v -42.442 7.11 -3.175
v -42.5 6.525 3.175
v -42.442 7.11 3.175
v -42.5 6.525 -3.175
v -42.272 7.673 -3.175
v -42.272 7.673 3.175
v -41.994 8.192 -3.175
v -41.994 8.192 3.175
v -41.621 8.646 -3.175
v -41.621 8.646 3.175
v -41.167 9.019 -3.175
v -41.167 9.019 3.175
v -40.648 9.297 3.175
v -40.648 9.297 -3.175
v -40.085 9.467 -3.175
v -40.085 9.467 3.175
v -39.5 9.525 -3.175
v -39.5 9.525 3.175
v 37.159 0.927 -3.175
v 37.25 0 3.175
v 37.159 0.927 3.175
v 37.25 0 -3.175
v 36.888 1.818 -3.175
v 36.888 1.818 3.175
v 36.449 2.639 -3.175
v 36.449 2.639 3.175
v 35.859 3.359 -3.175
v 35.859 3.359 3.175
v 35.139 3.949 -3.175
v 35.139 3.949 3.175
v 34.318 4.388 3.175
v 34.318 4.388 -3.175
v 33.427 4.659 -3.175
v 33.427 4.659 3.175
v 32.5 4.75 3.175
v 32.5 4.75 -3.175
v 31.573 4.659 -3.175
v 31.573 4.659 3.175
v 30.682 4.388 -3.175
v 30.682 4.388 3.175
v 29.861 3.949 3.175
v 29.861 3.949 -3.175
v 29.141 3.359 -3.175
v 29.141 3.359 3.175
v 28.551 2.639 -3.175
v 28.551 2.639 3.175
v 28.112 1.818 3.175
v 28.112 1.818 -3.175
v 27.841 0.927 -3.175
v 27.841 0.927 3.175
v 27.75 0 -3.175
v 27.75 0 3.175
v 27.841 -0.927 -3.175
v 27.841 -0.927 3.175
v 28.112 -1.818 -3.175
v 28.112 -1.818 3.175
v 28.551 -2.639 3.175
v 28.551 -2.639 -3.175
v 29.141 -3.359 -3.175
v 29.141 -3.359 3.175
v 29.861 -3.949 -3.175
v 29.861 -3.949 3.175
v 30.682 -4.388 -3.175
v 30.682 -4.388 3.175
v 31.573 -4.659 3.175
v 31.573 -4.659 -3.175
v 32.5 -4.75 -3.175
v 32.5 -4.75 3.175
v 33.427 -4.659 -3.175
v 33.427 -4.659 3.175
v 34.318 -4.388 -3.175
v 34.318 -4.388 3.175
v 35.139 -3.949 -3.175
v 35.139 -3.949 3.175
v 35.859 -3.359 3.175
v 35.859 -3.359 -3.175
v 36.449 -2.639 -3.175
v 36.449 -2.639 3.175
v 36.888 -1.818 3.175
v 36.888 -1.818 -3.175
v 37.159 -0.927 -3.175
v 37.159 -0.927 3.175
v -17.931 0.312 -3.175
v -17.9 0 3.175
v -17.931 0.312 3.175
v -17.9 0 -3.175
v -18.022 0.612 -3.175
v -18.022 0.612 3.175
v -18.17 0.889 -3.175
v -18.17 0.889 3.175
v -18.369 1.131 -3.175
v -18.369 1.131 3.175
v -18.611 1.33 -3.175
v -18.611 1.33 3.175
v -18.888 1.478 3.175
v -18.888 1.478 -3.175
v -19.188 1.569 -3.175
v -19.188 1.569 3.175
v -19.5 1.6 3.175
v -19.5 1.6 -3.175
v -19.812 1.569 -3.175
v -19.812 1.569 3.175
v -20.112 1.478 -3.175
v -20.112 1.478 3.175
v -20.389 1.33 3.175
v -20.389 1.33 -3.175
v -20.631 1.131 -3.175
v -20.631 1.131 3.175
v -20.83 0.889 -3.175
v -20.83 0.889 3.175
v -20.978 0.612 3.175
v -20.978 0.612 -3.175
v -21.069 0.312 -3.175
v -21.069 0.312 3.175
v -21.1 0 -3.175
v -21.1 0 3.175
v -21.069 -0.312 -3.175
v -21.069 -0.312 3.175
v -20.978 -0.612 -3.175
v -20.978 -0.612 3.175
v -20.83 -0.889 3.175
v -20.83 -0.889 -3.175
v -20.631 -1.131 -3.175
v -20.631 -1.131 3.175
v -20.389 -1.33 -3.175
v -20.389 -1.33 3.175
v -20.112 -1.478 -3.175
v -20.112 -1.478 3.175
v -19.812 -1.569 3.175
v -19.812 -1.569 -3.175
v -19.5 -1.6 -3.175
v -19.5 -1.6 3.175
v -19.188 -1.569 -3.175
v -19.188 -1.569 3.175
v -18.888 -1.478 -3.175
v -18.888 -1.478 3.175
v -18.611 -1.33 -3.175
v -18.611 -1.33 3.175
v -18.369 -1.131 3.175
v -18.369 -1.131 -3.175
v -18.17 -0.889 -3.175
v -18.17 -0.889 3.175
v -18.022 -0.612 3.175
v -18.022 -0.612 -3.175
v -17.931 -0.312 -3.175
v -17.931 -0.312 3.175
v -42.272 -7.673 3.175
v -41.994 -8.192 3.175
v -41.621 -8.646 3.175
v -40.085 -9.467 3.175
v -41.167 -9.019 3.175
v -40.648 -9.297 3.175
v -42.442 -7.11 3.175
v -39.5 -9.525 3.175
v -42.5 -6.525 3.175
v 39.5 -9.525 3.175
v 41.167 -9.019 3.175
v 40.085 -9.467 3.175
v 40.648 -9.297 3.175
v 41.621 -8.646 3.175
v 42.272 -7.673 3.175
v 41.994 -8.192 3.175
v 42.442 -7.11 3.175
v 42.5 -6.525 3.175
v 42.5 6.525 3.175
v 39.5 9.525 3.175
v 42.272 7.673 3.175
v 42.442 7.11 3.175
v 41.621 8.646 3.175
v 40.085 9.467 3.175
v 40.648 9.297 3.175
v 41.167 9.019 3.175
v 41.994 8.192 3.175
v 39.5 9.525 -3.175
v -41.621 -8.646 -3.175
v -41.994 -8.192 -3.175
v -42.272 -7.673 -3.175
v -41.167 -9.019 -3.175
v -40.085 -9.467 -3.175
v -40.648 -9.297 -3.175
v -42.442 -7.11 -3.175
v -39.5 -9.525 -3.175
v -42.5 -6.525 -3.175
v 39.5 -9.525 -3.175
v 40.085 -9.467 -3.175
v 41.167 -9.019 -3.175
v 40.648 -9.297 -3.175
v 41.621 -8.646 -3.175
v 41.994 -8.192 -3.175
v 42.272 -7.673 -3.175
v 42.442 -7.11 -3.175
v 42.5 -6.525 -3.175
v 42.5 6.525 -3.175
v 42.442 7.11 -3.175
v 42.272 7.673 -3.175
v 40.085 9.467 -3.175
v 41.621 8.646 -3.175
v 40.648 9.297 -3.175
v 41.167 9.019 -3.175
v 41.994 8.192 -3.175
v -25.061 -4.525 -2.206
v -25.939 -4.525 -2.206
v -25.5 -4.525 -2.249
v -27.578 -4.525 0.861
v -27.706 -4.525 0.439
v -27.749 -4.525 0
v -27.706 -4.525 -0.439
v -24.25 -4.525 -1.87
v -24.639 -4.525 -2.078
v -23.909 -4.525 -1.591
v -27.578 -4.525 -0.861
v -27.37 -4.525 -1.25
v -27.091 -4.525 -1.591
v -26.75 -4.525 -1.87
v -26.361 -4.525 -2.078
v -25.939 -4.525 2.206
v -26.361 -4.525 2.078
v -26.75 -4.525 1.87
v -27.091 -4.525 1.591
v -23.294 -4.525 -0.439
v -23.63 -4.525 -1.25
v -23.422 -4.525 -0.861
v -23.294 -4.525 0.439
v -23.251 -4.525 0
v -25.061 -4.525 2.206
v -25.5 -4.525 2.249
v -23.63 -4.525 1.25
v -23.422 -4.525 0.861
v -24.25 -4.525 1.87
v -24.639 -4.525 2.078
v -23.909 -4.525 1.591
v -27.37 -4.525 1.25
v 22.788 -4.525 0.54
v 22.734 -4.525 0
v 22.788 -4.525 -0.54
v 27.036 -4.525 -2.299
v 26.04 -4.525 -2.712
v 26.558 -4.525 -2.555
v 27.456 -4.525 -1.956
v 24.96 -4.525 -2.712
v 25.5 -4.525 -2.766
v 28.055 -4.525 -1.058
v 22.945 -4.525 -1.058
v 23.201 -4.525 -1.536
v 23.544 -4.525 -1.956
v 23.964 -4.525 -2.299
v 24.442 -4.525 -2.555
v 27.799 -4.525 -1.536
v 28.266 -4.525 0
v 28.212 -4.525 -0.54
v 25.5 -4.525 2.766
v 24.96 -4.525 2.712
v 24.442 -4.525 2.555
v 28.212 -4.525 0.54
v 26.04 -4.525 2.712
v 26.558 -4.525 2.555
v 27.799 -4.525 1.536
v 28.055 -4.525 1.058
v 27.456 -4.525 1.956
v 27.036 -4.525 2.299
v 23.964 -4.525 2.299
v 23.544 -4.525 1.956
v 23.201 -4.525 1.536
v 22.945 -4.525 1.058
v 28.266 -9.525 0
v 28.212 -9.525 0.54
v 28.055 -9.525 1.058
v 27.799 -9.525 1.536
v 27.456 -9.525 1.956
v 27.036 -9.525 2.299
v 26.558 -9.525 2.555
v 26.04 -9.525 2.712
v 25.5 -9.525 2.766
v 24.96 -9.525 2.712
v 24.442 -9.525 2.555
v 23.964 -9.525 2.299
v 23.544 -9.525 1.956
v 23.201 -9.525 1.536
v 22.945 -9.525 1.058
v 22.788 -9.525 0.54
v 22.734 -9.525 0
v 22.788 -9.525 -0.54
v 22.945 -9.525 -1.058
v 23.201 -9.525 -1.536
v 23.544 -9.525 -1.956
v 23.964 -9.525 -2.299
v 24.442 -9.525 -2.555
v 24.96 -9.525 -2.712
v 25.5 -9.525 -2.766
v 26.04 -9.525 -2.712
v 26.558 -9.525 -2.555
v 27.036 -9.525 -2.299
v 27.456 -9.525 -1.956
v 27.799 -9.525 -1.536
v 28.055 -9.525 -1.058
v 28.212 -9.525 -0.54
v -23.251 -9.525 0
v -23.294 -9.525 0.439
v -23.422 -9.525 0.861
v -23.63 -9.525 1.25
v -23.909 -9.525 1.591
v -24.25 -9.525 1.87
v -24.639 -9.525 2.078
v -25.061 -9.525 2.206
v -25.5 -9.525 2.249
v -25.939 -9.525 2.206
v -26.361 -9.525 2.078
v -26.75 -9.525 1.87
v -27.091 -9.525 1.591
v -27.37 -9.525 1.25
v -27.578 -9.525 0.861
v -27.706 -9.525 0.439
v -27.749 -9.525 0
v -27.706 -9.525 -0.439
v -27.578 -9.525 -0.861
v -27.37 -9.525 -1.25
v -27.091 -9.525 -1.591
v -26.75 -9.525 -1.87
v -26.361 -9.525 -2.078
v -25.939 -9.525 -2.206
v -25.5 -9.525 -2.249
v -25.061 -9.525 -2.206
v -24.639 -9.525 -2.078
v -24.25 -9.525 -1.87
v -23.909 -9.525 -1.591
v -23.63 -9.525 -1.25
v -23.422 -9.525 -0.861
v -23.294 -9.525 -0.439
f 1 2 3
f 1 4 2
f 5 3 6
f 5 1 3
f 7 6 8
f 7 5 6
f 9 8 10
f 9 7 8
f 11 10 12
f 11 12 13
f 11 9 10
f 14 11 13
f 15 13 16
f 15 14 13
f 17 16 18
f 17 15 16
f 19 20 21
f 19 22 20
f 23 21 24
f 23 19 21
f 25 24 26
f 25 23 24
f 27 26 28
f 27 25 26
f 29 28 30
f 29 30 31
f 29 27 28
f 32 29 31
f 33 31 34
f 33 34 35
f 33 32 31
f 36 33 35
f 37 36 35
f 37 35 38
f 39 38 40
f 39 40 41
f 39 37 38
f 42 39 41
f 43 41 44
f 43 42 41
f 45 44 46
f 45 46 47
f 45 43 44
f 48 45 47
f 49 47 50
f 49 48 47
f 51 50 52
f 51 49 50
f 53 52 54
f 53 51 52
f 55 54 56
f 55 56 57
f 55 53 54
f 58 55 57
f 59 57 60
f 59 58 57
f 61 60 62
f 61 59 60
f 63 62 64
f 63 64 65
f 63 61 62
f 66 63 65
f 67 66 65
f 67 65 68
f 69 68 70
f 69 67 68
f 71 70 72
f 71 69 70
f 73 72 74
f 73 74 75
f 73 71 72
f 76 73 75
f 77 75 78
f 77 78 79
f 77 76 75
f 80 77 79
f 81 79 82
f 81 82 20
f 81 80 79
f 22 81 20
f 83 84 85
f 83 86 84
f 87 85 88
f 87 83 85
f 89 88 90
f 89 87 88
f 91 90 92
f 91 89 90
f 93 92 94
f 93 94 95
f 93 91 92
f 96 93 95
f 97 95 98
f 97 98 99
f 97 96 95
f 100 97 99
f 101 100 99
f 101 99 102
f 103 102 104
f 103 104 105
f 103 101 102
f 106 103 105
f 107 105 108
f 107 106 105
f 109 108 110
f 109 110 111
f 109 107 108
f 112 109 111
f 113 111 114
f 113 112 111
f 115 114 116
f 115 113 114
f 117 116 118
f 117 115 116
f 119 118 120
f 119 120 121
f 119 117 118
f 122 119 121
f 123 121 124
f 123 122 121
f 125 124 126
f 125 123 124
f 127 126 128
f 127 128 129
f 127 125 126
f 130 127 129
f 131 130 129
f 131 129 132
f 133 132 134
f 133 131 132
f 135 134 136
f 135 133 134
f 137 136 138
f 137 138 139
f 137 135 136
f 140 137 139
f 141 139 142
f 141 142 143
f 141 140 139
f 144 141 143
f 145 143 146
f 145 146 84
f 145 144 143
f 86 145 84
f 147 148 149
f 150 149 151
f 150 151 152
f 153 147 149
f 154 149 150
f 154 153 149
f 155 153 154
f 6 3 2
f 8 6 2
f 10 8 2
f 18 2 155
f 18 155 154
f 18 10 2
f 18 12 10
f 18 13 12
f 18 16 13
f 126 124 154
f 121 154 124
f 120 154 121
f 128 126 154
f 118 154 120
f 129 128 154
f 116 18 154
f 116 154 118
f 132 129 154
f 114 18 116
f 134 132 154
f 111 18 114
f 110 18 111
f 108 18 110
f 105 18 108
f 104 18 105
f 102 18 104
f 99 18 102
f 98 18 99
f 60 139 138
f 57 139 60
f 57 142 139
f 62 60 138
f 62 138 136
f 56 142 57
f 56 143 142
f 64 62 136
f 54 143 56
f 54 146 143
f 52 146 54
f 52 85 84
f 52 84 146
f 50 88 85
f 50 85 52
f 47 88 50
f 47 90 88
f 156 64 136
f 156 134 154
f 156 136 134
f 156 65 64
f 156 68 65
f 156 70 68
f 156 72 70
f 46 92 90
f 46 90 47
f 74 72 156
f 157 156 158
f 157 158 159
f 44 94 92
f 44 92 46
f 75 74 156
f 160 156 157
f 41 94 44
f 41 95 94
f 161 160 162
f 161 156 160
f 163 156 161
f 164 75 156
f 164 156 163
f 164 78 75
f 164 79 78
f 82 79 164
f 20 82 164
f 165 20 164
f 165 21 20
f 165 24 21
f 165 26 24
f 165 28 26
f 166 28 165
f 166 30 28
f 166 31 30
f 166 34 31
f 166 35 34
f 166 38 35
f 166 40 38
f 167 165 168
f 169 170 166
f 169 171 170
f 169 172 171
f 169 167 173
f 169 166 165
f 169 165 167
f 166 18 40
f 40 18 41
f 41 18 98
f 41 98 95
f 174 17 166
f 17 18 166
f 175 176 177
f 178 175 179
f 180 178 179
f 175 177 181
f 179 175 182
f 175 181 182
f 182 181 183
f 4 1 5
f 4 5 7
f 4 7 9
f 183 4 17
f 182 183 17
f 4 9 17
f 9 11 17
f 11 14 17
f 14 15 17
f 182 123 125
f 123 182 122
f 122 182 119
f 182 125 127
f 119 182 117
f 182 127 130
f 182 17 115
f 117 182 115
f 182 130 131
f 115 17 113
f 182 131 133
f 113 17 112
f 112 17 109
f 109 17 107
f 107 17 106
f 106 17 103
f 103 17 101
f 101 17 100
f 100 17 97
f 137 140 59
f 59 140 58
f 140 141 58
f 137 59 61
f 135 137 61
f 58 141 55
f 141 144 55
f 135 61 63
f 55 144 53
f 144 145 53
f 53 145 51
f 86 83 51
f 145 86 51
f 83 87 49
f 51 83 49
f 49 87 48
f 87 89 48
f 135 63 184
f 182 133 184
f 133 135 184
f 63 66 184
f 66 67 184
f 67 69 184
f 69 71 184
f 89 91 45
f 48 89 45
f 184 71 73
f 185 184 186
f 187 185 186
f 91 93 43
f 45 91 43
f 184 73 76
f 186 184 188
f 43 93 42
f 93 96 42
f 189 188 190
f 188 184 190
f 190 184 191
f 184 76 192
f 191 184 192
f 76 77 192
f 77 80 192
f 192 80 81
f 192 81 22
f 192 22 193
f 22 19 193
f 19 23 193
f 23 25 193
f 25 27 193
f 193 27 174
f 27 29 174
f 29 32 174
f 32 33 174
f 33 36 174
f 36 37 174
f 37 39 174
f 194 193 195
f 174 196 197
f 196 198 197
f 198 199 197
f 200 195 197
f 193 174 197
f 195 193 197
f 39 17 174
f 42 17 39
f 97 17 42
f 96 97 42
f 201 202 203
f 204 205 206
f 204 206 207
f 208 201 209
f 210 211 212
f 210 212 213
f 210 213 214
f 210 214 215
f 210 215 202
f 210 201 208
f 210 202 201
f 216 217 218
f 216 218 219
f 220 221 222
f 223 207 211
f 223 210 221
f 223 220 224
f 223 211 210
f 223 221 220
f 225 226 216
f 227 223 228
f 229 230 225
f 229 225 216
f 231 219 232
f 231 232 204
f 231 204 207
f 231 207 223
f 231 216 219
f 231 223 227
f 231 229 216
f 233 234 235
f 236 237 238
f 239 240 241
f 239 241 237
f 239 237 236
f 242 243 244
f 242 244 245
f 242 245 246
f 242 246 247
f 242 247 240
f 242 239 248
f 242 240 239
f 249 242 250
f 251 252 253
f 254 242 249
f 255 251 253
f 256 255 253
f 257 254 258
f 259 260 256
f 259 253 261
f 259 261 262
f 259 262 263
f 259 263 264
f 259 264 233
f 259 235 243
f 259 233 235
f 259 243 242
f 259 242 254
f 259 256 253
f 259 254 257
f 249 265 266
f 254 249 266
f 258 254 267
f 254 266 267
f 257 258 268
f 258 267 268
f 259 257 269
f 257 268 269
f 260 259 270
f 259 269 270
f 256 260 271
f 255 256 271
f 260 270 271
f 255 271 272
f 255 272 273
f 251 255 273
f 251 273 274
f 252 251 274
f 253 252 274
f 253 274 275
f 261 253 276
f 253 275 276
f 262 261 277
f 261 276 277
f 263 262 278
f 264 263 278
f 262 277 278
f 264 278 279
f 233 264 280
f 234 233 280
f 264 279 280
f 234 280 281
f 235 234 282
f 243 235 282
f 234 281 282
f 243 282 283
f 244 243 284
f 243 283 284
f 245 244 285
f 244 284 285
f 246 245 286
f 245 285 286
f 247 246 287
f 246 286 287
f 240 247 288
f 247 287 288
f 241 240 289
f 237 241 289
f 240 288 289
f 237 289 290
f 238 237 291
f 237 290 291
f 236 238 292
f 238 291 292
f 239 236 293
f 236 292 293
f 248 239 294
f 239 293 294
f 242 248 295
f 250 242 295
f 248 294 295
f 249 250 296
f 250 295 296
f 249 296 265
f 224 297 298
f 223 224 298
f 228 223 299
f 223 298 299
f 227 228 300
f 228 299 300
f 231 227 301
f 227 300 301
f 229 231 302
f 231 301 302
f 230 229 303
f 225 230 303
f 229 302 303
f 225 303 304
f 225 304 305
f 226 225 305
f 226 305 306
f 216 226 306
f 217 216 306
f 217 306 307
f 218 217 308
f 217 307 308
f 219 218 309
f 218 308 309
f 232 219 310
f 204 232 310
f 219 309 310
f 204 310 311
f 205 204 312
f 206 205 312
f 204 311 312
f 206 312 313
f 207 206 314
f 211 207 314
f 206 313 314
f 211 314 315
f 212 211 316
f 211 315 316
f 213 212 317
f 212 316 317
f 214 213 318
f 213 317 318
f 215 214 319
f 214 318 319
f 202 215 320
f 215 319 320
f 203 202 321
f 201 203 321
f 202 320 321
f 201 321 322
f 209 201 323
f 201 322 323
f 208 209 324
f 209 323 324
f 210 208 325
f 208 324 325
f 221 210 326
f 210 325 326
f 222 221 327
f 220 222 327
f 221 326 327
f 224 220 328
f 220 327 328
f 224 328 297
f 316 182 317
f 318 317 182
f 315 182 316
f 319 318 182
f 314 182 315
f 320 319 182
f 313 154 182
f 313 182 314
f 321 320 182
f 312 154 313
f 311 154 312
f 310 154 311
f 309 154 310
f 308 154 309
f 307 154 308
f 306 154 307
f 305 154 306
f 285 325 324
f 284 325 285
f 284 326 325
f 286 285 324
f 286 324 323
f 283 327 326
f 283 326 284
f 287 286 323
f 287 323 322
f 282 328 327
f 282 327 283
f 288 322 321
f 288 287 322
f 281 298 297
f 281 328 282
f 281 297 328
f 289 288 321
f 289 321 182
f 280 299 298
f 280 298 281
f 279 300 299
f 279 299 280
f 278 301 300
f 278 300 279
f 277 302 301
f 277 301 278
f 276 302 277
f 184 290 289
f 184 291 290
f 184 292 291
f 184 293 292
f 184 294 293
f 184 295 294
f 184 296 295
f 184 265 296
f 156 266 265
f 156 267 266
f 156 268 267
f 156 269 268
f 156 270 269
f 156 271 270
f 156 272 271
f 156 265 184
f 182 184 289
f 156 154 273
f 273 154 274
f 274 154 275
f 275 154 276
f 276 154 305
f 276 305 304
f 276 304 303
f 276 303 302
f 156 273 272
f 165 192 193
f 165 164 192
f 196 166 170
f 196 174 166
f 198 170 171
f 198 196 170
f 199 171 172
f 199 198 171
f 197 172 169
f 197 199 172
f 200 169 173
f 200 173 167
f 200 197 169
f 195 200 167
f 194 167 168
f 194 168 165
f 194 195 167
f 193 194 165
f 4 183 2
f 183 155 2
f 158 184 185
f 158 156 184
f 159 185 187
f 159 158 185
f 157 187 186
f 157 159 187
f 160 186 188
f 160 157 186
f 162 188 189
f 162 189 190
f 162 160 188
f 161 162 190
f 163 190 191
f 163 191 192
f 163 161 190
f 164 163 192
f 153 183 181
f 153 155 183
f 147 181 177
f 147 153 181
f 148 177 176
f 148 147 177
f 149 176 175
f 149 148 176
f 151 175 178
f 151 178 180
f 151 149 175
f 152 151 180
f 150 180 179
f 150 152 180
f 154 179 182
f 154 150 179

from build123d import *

# Parameters (mm, degrees)
F0_W     = 85
F0_H     = 19.05
F0_R     = 1.6
F0_R_2   = 4.75
F1_DEPTH = 3.175
F2_R     = 2.249345
F2_R_2   = 2.765541
F3_DEPTH = 5
F4_R     = 3


with BuildPart() as f1:
    # F0 (on Top) → F1 (new body, symmetric)
    with BuildSketch(Plane.XY):
        Rectangle(F0_W, F0_H)
        with Locations((-19.5, 0)):
            Circle(F0_R, mode=Mode.SUBTRACT)
        with Locations((32.5, 0)):
            Circle(F0_R_2, mode=Mode.SUBTRACT)
    extrude(amount=F1_DEPTH, both=True)

    # F2 (on face) → F3 (cut)
    with BuildSketch(Plane.XZ.offset(9.525)):
        with Locations((-25.5, 0)):
            Circle(F2_R)
        with Locations((25.5, 0)):
            Circle(F2_R_2)
    extrude(amount=-F3_DEPTH, mode=Mode.SUBTRACT)

    # F4
    f4_edges = [f1.edges().sort_by_distance(p)[0] for p in [
        (42.5, -9.525, 0),
        (42.5, 9.525, 0),
        (-42.5, -9.525, 0),
        (-42.5, 9.525, 0),
    ]]
    fillet(f4_edges, radius=F4_R)


solid = f1.part
